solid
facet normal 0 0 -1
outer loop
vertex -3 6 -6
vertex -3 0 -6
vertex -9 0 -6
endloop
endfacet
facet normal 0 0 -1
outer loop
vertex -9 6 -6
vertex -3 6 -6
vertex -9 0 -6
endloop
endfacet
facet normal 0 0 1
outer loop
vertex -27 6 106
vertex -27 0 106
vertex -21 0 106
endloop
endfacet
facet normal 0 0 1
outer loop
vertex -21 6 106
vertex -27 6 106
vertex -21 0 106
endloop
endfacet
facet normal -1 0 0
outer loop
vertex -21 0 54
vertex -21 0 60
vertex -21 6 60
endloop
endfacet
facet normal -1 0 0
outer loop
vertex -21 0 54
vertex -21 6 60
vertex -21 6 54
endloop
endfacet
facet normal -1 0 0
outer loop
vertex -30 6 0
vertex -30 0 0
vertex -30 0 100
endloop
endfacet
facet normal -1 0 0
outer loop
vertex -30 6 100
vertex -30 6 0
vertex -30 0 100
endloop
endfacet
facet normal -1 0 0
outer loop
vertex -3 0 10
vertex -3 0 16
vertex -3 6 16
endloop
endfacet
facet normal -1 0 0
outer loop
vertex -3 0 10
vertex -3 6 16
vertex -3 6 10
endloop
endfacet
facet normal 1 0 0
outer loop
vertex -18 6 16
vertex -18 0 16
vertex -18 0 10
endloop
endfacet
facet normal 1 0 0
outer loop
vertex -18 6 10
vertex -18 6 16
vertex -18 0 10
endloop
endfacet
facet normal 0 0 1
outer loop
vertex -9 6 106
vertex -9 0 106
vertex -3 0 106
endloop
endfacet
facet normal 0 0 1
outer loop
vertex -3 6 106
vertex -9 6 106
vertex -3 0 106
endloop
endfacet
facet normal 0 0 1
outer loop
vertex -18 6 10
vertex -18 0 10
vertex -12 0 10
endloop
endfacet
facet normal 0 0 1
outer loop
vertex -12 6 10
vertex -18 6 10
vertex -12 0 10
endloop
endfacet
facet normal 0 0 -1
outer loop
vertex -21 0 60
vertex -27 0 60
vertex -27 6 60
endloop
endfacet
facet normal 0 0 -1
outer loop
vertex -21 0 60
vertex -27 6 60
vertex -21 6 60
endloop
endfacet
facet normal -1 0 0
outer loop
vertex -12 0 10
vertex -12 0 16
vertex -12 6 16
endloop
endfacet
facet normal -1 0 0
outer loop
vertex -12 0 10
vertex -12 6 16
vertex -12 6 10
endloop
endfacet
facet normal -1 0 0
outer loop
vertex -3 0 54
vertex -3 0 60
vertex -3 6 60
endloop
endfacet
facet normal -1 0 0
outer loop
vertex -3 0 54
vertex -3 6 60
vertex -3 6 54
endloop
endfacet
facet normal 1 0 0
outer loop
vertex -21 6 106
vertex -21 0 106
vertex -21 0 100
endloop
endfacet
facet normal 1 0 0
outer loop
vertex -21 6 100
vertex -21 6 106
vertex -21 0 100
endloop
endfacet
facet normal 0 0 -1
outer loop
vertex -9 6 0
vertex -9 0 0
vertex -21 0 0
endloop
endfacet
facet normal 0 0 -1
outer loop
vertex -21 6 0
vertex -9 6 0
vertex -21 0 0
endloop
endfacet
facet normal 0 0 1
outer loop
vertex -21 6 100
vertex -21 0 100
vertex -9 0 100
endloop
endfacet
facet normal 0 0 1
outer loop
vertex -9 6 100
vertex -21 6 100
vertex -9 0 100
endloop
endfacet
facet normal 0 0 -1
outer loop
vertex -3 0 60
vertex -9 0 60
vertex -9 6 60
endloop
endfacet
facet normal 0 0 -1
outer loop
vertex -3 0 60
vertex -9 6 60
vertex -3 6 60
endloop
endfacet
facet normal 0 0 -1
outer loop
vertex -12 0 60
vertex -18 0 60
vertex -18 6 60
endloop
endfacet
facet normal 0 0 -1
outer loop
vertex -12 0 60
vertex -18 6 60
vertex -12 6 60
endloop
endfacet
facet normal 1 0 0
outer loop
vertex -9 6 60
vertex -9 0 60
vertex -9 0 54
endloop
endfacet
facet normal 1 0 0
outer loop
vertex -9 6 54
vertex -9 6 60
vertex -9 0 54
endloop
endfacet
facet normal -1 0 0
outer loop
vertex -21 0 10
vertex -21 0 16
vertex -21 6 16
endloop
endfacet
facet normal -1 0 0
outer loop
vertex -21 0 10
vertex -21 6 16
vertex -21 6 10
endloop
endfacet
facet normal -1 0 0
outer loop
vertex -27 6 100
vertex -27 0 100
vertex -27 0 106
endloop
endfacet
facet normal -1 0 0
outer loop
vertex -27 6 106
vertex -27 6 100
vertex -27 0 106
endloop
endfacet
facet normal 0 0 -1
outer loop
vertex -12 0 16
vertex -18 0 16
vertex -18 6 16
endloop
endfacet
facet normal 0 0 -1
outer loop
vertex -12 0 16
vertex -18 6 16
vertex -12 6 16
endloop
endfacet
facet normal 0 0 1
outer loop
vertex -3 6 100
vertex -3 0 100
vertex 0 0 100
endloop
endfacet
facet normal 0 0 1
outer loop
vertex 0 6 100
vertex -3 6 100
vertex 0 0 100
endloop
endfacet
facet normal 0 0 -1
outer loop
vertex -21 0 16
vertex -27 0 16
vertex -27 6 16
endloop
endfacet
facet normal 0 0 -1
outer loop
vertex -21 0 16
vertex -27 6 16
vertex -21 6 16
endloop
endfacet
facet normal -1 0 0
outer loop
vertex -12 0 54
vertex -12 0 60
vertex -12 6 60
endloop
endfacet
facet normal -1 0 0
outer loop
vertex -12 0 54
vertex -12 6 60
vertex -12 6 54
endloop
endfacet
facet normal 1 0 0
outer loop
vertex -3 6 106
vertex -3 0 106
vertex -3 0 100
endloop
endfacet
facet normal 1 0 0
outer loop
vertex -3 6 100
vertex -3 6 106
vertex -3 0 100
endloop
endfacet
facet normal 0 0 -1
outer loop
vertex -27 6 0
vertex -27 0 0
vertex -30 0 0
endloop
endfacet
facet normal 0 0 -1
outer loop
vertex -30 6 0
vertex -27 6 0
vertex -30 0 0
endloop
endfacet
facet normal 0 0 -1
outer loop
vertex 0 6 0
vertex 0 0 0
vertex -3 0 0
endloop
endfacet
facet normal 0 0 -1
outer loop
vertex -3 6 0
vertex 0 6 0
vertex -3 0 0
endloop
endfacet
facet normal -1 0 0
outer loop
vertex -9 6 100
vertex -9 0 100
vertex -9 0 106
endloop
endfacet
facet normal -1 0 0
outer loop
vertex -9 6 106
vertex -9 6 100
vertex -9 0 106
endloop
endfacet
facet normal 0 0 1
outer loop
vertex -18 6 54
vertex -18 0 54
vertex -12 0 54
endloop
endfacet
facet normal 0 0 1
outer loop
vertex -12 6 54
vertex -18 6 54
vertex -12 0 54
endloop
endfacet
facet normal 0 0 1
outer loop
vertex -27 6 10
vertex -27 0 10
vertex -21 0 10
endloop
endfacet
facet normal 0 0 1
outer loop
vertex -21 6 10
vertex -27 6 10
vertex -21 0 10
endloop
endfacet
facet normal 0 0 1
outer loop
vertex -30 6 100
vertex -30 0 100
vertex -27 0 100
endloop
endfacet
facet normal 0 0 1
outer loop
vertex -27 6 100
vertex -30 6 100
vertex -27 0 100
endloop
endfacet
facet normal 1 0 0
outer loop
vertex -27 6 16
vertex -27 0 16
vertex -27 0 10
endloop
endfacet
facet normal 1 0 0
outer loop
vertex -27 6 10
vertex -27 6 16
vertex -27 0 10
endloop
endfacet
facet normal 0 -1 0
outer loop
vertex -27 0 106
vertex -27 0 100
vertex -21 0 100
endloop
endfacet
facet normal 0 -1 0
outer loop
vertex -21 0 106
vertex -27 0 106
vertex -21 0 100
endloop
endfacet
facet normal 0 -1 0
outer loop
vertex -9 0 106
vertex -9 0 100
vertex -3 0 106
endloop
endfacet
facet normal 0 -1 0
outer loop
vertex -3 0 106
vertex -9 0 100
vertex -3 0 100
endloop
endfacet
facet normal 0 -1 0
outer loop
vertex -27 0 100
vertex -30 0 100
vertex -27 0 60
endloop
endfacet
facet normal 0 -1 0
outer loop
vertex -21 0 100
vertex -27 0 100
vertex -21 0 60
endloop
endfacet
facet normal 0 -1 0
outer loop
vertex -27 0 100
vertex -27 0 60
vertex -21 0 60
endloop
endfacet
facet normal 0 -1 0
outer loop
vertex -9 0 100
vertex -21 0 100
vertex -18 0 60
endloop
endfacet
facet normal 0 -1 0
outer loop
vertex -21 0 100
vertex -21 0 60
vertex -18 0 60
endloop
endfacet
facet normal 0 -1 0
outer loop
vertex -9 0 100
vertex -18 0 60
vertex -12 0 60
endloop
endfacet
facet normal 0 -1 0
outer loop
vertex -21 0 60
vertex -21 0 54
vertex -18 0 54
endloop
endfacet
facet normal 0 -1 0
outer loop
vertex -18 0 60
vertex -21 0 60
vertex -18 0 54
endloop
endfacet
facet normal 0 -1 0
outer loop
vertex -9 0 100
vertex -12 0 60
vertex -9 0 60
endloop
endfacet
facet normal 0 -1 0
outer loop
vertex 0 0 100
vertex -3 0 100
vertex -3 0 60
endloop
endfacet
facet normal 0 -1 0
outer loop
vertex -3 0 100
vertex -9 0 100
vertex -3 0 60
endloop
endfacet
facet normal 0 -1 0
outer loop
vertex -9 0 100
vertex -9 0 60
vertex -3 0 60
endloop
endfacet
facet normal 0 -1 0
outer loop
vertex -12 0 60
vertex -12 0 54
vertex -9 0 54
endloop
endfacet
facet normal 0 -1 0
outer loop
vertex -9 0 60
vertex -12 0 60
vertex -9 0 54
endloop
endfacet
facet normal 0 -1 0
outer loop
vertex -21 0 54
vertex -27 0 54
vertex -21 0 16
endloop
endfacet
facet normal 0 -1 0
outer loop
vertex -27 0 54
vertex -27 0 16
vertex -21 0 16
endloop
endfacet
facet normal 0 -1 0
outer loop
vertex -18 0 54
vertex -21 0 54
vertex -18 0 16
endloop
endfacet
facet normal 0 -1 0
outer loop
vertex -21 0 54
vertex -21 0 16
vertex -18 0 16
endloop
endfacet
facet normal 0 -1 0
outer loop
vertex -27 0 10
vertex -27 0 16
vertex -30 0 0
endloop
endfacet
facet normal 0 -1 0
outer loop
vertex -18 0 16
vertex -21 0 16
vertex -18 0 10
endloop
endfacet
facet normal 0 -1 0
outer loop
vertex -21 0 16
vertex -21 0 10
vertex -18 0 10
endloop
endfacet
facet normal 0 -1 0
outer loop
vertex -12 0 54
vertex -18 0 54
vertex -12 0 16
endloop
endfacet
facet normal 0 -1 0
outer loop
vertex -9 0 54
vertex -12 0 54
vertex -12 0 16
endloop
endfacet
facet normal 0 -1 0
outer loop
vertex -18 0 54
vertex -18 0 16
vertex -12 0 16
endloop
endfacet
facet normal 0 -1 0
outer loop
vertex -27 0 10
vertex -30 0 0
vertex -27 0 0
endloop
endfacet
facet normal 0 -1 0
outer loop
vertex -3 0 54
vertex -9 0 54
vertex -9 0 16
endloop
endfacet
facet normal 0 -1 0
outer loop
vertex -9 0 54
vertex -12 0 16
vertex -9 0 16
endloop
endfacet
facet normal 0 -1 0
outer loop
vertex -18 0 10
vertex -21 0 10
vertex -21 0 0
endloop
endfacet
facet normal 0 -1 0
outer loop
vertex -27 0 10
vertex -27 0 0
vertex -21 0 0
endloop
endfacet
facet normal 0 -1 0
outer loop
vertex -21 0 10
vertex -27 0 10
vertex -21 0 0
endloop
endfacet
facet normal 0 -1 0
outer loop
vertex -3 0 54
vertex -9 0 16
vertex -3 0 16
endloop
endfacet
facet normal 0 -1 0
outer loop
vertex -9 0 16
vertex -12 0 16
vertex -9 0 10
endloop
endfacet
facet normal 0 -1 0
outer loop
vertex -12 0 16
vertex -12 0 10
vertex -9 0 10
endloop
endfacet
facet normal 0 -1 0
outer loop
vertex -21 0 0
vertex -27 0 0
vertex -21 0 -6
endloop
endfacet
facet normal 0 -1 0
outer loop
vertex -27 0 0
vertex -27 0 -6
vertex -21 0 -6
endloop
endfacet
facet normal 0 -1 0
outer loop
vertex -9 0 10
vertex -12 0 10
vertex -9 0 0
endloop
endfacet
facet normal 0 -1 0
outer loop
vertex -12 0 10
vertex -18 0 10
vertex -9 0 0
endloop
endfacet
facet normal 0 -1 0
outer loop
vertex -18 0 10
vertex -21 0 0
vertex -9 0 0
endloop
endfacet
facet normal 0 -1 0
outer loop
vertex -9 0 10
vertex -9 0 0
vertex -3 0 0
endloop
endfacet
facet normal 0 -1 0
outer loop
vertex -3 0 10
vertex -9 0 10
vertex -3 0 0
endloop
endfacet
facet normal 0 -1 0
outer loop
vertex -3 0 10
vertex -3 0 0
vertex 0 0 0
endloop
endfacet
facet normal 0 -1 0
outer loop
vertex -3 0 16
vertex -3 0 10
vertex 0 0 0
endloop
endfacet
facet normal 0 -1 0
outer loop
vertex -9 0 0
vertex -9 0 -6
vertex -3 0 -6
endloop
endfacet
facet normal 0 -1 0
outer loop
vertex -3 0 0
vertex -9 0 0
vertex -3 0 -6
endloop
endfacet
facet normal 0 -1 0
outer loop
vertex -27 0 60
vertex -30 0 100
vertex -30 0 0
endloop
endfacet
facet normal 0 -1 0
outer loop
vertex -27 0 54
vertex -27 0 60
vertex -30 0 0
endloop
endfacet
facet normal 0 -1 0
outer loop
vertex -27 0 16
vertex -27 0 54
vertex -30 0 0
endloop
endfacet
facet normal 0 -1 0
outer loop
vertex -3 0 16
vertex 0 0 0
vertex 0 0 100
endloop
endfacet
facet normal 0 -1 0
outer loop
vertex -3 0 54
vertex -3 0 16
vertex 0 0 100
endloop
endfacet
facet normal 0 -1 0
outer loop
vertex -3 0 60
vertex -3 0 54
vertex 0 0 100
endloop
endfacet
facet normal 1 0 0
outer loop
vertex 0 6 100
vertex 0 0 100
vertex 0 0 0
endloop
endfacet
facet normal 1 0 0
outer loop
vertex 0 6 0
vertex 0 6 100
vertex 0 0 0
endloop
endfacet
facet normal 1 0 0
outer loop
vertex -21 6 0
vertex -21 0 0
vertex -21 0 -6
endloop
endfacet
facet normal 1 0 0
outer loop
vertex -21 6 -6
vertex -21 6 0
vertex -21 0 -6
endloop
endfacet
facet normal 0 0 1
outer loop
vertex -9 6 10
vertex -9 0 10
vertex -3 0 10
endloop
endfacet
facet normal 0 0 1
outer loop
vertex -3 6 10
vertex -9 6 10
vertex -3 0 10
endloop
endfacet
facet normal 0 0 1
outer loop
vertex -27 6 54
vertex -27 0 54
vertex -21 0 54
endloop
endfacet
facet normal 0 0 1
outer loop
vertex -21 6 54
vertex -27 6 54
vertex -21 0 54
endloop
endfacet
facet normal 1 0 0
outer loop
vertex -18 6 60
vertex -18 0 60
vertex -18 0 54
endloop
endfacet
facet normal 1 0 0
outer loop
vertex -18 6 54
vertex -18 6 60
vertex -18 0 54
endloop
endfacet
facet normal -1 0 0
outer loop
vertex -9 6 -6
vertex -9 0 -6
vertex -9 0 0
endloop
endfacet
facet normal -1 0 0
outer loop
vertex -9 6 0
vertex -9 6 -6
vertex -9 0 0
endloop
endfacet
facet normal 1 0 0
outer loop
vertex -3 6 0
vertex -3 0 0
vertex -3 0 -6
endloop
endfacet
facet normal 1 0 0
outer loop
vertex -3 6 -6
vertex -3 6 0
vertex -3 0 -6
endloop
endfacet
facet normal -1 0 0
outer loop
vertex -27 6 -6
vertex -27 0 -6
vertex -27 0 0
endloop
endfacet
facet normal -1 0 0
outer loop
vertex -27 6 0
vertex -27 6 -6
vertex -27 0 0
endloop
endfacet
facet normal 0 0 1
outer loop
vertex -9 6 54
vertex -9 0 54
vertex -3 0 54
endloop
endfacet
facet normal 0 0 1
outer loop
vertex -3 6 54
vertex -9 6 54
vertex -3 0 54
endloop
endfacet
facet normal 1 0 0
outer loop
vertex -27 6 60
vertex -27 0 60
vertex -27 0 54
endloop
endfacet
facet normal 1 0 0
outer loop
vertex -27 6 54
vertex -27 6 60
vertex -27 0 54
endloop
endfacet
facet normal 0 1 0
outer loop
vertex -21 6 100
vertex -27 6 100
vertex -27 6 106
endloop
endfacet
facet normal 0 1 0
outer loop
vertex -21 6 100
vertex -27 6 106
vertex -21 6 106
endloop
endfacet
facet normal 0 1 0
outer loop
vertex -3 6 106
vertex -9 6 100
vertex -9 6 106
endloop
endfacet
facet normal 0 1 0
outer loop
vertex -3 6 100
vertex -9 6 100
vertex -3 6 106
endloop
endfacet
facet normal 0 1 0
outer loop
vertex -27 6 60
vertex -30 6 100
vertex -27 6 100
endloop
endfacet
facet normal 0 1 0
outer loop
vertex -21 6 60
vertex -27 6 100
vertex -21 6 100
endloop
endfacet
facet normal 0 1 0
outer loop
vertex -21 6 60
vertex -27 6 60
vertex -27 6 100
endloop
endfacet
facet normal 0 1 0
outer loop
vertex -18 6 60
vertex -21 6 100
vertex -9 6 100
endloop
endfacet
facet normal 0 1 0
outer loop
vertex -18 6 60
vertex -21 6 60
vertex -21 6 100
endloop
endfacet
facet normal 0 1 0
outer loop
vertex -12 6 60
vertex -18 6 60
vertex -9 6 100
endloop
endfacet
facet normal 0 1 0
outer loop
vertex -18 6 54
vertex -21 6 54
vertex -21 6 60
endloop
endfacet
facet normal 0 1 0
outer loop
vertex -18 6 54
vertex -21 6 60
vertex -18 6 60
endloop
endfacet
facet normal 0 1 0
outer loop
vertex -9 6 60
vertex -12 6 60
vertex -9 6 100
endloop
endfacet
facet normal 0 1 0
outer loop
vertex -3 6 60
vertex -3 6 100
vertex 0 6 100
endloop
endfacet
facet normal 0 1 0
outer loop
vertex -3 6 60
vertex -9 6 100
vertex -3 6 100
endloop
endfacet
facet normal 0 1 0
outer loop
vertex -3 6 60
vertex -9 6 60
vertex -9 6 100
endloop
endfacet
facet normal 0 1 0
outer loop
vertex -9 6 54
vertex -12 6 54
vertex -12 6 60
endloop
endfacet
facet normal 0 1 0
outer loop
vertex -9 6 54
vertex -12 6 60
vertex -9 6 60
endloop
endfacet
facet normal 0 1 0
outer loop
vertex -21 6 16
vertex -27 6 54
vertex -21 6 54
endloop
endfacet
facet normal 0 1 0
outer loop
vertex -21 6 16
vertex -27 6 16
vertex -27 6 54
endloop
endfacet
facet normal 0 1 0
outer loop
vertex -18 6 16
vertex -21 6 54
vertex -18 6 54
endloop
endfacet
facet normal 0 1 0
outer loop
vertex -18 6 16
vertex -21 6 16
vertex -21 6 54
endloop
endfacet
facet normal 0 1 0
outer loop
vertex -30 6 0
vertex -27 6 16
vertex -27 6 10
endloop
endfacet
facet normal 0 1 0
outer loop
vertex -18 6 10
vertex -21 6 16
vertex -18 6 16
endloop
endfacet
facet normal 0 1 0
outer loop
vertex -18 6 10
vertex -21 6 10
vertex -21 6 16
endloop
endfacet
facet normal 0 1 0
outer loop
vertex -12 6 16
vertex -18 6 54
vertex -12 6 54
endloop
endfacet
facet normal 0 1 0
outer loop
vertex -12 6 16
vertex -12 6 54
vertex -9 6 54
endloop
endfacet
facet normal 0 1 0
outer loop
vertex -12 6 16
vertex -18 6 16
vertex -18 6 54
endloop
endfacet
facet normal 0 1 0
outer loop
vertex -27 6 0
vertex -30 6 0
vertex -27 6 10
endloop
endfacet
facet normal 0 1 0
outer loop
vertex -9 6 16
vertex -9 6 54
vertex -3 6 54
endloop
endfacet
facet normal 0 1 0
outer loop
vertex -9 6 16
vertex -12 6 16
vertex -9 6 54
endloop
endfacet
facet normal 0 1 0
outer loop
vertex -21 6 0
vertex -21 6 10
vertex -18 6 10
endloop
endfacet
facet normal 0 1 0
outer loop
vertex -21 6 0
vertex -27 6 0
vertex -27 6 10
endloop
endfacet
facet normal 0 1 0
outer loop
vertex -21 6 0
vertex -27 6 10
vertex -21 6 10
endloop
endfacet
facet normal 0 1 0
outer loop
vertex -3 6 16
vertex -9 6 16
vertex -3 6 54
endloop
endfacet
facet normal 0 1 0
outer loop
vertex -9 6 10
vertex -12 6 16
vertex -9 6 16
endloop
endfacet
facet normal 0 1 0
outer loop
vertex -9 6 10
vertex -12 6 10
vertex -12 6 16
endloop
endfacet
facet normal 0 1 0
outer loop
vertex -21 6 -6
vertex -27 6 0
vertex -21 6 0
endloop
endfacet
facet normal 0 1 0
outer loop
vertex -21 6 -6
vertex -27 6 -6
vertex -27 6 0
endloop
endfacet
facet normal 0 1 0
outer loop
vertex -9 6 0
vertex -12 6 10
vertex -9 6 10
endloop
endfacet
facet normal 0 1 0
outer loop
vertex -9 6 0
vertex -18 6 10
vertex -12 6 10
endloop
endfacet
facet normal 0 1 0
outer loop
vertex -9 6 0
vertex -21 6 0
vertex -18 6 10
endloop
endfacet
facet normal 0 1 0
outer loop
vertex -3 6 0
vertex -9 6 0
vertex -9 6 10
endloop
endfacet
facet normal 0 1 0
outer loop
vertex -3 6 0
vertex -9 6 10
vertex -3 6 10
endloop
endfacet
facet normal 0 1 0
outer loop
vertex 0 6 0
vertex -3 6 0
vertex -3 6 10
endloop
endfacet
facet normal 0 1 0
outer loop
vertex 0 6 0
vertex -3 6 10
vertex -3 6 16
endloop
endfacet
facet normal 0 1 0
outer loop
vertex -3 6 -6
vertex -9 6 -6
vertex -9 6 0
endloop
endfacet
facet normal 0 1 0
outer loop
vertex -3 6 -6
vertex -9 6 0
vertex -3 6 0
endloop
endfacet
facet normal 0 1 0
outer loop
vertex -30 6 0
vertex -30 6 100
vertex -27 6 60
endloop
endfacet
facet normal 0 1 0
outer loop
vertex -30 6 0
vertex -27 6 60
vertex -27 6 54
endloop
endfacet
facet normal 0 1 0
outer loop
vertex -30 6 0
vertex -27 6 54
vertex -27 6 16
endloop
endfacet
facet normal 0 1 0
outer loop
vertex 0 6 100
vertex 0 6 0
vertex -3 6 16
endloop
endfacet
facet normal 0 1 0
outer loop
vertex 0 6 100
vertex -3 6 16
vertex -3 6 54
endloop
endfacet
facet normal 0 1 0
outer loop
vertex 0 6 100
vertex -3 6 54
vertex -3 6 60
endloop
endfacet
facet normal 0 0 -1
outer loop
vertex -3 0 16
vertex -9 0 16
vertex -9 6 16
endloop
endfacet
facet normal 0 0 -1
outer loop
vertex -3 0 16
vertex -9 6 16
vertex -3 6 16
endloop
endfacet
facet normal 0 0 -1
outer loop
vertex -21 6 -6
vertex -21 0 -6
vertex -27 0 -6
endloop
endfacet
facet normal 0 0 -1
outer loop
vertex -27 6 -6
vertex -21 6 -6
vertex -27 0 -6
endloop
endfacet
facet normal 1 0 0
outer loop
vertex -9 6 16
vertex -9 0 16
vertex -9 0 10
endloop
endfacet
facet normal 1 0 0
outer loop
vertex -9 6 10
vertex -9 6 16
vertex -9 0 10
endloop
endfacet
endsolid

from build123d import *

# Parameters (mm, degrees)
SKETCH1_W           = 6
SKETCH1_H           = 6
BOSS_EXTRUDE2_DEPTH = 6


with BuildPart() as part:
    # Sketch1 → Boss-Extrude2 (new body)
    with BuildSketch(Plane(origin=(0, 0, 0), x_dir=(1, 0, 0), z_dir=(0, 1, 0))):
        Polygon((0, 0), (-3, 0), (-3, 6), (-9, 6), (-9, 0), (-21, 0), (-21, 6), (-27, 6), (-27, 0), (-30, 0), (-30, -100), (-27, -100), (-27, -106), (-21, -106), (-21, -100), (-9, -100), (-9, -106), (-3, -106), (-3, -100), (0, -100), align=None)
        with Locations((-15, -57)):
            Rectangle(SKETCH1_W, SKETCH1_H, mode=Mode.SUBTRACT)
        with Locations((-6, -57)):
            Rectangle(SKETCH1_W, SKETCH1_H, mode=Mode.SUBTRACT)
        with Locations((-24, -57)):
            Rectangle(SKETCH1_W, SKETCH1_H, mode=Mode.SUBTRACT)
        with Locations((-15, -13)):
            Rectangle(SKETCH1_W, SKETCH1_H, mode=Mode.SUBTRACT)
        with Locations((-6, -13)):
            Rectangle(SKETCH1_W, SKETCH1_H, mode=Mode.SUBTRACT)
        with Locations((-24, -13)):
            Rectangle(SKETCH1_W, SKETCH1_H, mode=Mode.SUBTRACT)
    extrude(amount=BOSS_EXTRUDE2_DEPTH)


solid = part.part
